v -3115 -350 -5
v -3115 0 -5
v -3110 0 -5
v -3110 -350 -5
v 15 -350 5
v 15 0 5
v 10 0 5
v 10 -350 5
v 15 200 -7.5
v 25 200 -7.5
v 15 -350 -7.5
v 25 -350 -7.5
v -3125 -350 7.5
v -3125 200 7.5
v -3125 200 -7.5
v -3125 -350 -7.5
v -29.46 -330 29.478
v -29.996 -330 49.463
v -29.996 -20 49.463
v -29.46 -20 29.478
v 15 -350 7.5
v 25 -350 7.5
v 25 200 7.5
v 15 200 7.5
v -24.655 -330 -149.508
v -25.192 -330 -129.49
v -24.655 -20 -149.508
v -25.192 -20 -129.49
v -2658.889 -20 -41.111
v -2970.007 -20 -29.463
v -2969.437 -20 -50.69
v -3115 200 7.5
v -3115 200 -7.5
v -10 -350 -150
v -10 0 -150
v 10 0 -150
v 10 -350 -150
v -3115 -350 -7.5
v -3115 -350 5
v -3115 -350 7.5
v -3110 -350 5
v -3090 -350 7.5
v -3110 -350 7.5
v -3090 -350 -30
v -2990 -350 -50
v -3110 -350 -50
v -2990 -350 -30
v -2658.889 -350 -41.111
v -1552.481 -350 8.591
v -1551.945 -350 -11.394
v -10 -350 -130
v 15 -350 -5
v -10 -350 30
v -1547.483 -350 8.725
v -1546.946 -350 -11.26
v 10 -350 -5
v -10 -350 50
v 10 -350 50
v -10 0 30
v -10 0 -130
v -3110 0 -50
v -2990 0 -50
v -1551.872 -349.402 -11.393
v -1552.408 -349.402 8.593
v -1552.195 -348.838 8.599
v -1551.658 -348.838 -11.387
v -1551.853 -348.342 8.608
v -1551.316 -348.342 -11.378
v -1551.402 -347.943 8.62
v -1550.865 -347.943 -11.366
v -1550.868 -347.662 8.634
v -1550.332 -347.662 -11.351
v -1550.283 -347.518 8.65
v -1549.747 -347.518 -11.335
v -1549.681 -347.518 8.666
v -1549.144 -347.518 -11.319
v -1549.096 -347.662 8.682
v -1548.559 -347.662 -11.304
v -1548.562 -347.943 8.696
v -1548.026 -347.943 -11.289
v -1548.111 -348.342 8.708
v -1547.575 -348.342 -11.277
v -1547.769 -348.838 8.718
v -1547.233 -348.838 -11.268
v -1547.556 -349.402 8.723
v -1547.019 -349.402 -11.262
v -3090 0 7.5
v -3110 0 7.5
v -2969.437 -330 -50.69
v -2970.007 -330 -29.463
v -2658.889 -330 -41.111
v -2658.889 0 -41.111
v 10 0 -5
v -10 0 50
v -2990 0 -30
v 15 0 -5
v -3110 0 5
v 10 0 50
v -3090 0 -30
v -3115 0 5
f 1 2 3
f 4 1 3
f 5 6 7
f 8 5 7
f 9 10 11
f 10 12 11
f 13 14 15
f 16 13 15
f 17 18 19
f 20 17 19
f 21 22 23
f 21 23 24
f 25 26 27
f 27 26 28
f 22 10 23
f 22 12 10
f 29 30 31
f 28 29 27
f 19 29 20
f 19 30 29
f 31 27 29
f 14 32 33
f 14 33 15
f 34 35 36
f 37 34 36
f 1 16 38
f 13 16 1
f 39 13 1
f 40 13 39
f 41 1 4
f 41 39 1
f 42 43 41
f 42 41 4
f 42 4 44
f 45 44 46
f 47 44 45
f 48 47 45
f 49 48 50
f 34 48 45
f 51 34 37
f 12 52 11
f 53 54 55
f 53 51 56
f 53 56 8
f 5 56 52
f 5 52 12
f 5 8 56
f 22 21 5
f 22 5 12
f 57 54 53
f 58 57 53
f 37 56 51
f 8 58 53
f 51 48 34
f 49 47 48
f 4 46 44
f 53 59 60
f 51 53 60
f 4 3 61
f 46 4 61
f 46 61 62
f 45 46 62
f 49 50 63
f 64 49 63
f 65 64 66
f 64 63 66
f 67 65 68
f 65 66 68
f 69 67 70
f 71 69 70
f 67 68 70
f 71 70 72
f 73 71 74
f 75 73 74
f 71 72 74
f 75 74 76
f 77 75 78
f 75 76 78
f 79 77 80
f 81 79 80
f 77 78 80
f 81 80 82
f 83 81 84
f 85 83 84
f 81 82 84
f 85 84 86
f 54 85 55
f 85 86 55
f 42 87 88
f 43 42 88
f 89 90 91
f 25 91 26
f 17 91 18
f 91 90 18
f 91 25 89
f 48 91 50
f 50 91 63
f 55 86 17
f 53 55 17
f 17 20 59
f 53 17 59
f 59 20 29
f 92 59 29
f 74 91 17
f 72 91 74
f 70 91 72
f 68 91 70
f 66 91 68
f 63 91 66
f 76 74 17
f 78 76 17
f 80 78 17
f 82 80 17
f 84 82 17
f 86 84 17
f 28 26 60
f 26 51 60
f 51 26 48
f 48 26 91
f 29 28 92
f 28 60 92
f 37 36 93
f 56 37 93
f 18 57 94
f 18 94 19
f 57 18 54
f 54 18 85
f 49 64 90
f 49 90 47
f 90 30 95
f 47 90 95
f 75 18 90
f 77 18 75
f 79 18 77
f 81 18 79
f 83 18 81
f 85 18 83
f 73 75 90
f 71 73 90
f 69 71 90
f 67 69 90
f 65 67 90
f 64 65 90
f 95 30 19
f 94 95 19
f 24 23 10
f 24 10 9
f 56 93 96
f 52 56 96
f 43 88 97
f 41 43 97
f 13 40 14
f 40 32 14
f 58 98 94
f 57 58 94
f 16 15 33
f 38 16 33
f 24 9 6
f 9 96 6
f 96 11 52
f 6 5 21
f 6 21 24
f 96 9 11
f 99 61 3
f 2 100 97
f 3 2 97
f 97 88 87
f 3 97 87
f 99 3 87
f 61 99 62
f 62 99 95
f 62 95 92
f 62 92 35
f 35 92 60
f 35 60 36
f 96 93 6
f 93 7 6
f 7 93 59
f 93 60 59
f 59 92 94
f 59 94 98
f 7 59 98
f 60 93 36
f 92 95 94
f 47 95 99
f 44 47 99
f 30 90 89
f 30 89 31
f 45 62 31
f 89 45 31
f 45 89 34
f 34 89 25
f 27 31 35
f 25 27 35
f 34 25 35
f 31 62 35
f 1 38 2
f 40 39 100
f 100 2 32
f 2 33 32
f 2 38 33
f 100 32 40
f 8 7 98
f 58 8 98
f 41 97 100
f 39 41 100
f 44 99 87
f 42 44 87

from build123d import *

# Parameters (mm, degrees)
F1_DEPTH  = 350
F3_W      = 2941.07
F3_H      = 310
F4_DEPTH  = 250
F6_W      = 10
F6_H      = 15
F7_DEPTH  = 200
F10_D     = 5
F10_DEPTH = 50
F10_TIP   = 1.5021515476


with BuildPart() as f1:
    # F0 (on Front) → F1 (new body)
    with BuildSketch(Plane.XZ):
        Polygon((-2990, -50), (-10, -150), (10, -150), (10, -5), (15, -5), (15, -7.5), (25, -7.5), (25, 7.5), (15, 7.5), (15, 5), (10, 5), (10, 50), (-10, 50), (-2990, -30), (-3090, -30), (-3090, 7.5), (-3110, 7.5), (-3110, 5), (-3115, 5), (-3115, 7.5), (-3125, 7.5), (-3125, -7.5), (-3115, -7.5), (-3115, -5), (-3110, -5), (-3110, -50), align=None)
        Polygon((-2658.8888888889, -41.1111111111), (-10, 30), (-10, -130), align=None, mode=Mode.SUBTRACT)
    extrude(amount=F1_DEPTH)

    # F3 (on offset) → F4 (cut)
    with BuildSketch(Plane(origin=(-1.3485169015, 0, 50.2322545798), x_dir=(0.9996398505, 0, 0.0268359691), z_dir=(-0.0268359691, 0, 0.9996398505))):
        with Locations((-1499.1932015429, -175)):
            Rectangle(F3_W, F3_H)
    extrude(amount=-F4_DEPTH, mode=Mode.SUBTRACT)

    # F6 (on offset) → F7 (join)
    with BuildSketch(Plane(origin=(0, 0, 0), x_dir=(-1, 0, 0), z_dir=(0, 1, 0))):
        with Locations((-20, 0)):
            Rectangle(F6_W, F6_H)
        with Locations((3120, 0)):
            Rectangle(F6_W, F6_H)
    extrude(amount=F7_DEPTH)

    # F10
    with Locations(Plane(origin=(-1.3485169015, 0, 50.2322545798), x_dir=(0.9996398505, 0, 0.0268359691), z_dir=(-0.0268359691, 0, 0.9996398505))):
        with Locations((-1549.191416098, -350)):
            Hole(F10_D / 2, depth=F10_DEPTH)
            with Locations((0, 0, -(F10_DEPTH + F10_TIP / 2))):  # 118° drill point
                Cone(0, F10_D / 2, F10_TIP, mode=Mode.SUBTRACT)


solid = f1.part
